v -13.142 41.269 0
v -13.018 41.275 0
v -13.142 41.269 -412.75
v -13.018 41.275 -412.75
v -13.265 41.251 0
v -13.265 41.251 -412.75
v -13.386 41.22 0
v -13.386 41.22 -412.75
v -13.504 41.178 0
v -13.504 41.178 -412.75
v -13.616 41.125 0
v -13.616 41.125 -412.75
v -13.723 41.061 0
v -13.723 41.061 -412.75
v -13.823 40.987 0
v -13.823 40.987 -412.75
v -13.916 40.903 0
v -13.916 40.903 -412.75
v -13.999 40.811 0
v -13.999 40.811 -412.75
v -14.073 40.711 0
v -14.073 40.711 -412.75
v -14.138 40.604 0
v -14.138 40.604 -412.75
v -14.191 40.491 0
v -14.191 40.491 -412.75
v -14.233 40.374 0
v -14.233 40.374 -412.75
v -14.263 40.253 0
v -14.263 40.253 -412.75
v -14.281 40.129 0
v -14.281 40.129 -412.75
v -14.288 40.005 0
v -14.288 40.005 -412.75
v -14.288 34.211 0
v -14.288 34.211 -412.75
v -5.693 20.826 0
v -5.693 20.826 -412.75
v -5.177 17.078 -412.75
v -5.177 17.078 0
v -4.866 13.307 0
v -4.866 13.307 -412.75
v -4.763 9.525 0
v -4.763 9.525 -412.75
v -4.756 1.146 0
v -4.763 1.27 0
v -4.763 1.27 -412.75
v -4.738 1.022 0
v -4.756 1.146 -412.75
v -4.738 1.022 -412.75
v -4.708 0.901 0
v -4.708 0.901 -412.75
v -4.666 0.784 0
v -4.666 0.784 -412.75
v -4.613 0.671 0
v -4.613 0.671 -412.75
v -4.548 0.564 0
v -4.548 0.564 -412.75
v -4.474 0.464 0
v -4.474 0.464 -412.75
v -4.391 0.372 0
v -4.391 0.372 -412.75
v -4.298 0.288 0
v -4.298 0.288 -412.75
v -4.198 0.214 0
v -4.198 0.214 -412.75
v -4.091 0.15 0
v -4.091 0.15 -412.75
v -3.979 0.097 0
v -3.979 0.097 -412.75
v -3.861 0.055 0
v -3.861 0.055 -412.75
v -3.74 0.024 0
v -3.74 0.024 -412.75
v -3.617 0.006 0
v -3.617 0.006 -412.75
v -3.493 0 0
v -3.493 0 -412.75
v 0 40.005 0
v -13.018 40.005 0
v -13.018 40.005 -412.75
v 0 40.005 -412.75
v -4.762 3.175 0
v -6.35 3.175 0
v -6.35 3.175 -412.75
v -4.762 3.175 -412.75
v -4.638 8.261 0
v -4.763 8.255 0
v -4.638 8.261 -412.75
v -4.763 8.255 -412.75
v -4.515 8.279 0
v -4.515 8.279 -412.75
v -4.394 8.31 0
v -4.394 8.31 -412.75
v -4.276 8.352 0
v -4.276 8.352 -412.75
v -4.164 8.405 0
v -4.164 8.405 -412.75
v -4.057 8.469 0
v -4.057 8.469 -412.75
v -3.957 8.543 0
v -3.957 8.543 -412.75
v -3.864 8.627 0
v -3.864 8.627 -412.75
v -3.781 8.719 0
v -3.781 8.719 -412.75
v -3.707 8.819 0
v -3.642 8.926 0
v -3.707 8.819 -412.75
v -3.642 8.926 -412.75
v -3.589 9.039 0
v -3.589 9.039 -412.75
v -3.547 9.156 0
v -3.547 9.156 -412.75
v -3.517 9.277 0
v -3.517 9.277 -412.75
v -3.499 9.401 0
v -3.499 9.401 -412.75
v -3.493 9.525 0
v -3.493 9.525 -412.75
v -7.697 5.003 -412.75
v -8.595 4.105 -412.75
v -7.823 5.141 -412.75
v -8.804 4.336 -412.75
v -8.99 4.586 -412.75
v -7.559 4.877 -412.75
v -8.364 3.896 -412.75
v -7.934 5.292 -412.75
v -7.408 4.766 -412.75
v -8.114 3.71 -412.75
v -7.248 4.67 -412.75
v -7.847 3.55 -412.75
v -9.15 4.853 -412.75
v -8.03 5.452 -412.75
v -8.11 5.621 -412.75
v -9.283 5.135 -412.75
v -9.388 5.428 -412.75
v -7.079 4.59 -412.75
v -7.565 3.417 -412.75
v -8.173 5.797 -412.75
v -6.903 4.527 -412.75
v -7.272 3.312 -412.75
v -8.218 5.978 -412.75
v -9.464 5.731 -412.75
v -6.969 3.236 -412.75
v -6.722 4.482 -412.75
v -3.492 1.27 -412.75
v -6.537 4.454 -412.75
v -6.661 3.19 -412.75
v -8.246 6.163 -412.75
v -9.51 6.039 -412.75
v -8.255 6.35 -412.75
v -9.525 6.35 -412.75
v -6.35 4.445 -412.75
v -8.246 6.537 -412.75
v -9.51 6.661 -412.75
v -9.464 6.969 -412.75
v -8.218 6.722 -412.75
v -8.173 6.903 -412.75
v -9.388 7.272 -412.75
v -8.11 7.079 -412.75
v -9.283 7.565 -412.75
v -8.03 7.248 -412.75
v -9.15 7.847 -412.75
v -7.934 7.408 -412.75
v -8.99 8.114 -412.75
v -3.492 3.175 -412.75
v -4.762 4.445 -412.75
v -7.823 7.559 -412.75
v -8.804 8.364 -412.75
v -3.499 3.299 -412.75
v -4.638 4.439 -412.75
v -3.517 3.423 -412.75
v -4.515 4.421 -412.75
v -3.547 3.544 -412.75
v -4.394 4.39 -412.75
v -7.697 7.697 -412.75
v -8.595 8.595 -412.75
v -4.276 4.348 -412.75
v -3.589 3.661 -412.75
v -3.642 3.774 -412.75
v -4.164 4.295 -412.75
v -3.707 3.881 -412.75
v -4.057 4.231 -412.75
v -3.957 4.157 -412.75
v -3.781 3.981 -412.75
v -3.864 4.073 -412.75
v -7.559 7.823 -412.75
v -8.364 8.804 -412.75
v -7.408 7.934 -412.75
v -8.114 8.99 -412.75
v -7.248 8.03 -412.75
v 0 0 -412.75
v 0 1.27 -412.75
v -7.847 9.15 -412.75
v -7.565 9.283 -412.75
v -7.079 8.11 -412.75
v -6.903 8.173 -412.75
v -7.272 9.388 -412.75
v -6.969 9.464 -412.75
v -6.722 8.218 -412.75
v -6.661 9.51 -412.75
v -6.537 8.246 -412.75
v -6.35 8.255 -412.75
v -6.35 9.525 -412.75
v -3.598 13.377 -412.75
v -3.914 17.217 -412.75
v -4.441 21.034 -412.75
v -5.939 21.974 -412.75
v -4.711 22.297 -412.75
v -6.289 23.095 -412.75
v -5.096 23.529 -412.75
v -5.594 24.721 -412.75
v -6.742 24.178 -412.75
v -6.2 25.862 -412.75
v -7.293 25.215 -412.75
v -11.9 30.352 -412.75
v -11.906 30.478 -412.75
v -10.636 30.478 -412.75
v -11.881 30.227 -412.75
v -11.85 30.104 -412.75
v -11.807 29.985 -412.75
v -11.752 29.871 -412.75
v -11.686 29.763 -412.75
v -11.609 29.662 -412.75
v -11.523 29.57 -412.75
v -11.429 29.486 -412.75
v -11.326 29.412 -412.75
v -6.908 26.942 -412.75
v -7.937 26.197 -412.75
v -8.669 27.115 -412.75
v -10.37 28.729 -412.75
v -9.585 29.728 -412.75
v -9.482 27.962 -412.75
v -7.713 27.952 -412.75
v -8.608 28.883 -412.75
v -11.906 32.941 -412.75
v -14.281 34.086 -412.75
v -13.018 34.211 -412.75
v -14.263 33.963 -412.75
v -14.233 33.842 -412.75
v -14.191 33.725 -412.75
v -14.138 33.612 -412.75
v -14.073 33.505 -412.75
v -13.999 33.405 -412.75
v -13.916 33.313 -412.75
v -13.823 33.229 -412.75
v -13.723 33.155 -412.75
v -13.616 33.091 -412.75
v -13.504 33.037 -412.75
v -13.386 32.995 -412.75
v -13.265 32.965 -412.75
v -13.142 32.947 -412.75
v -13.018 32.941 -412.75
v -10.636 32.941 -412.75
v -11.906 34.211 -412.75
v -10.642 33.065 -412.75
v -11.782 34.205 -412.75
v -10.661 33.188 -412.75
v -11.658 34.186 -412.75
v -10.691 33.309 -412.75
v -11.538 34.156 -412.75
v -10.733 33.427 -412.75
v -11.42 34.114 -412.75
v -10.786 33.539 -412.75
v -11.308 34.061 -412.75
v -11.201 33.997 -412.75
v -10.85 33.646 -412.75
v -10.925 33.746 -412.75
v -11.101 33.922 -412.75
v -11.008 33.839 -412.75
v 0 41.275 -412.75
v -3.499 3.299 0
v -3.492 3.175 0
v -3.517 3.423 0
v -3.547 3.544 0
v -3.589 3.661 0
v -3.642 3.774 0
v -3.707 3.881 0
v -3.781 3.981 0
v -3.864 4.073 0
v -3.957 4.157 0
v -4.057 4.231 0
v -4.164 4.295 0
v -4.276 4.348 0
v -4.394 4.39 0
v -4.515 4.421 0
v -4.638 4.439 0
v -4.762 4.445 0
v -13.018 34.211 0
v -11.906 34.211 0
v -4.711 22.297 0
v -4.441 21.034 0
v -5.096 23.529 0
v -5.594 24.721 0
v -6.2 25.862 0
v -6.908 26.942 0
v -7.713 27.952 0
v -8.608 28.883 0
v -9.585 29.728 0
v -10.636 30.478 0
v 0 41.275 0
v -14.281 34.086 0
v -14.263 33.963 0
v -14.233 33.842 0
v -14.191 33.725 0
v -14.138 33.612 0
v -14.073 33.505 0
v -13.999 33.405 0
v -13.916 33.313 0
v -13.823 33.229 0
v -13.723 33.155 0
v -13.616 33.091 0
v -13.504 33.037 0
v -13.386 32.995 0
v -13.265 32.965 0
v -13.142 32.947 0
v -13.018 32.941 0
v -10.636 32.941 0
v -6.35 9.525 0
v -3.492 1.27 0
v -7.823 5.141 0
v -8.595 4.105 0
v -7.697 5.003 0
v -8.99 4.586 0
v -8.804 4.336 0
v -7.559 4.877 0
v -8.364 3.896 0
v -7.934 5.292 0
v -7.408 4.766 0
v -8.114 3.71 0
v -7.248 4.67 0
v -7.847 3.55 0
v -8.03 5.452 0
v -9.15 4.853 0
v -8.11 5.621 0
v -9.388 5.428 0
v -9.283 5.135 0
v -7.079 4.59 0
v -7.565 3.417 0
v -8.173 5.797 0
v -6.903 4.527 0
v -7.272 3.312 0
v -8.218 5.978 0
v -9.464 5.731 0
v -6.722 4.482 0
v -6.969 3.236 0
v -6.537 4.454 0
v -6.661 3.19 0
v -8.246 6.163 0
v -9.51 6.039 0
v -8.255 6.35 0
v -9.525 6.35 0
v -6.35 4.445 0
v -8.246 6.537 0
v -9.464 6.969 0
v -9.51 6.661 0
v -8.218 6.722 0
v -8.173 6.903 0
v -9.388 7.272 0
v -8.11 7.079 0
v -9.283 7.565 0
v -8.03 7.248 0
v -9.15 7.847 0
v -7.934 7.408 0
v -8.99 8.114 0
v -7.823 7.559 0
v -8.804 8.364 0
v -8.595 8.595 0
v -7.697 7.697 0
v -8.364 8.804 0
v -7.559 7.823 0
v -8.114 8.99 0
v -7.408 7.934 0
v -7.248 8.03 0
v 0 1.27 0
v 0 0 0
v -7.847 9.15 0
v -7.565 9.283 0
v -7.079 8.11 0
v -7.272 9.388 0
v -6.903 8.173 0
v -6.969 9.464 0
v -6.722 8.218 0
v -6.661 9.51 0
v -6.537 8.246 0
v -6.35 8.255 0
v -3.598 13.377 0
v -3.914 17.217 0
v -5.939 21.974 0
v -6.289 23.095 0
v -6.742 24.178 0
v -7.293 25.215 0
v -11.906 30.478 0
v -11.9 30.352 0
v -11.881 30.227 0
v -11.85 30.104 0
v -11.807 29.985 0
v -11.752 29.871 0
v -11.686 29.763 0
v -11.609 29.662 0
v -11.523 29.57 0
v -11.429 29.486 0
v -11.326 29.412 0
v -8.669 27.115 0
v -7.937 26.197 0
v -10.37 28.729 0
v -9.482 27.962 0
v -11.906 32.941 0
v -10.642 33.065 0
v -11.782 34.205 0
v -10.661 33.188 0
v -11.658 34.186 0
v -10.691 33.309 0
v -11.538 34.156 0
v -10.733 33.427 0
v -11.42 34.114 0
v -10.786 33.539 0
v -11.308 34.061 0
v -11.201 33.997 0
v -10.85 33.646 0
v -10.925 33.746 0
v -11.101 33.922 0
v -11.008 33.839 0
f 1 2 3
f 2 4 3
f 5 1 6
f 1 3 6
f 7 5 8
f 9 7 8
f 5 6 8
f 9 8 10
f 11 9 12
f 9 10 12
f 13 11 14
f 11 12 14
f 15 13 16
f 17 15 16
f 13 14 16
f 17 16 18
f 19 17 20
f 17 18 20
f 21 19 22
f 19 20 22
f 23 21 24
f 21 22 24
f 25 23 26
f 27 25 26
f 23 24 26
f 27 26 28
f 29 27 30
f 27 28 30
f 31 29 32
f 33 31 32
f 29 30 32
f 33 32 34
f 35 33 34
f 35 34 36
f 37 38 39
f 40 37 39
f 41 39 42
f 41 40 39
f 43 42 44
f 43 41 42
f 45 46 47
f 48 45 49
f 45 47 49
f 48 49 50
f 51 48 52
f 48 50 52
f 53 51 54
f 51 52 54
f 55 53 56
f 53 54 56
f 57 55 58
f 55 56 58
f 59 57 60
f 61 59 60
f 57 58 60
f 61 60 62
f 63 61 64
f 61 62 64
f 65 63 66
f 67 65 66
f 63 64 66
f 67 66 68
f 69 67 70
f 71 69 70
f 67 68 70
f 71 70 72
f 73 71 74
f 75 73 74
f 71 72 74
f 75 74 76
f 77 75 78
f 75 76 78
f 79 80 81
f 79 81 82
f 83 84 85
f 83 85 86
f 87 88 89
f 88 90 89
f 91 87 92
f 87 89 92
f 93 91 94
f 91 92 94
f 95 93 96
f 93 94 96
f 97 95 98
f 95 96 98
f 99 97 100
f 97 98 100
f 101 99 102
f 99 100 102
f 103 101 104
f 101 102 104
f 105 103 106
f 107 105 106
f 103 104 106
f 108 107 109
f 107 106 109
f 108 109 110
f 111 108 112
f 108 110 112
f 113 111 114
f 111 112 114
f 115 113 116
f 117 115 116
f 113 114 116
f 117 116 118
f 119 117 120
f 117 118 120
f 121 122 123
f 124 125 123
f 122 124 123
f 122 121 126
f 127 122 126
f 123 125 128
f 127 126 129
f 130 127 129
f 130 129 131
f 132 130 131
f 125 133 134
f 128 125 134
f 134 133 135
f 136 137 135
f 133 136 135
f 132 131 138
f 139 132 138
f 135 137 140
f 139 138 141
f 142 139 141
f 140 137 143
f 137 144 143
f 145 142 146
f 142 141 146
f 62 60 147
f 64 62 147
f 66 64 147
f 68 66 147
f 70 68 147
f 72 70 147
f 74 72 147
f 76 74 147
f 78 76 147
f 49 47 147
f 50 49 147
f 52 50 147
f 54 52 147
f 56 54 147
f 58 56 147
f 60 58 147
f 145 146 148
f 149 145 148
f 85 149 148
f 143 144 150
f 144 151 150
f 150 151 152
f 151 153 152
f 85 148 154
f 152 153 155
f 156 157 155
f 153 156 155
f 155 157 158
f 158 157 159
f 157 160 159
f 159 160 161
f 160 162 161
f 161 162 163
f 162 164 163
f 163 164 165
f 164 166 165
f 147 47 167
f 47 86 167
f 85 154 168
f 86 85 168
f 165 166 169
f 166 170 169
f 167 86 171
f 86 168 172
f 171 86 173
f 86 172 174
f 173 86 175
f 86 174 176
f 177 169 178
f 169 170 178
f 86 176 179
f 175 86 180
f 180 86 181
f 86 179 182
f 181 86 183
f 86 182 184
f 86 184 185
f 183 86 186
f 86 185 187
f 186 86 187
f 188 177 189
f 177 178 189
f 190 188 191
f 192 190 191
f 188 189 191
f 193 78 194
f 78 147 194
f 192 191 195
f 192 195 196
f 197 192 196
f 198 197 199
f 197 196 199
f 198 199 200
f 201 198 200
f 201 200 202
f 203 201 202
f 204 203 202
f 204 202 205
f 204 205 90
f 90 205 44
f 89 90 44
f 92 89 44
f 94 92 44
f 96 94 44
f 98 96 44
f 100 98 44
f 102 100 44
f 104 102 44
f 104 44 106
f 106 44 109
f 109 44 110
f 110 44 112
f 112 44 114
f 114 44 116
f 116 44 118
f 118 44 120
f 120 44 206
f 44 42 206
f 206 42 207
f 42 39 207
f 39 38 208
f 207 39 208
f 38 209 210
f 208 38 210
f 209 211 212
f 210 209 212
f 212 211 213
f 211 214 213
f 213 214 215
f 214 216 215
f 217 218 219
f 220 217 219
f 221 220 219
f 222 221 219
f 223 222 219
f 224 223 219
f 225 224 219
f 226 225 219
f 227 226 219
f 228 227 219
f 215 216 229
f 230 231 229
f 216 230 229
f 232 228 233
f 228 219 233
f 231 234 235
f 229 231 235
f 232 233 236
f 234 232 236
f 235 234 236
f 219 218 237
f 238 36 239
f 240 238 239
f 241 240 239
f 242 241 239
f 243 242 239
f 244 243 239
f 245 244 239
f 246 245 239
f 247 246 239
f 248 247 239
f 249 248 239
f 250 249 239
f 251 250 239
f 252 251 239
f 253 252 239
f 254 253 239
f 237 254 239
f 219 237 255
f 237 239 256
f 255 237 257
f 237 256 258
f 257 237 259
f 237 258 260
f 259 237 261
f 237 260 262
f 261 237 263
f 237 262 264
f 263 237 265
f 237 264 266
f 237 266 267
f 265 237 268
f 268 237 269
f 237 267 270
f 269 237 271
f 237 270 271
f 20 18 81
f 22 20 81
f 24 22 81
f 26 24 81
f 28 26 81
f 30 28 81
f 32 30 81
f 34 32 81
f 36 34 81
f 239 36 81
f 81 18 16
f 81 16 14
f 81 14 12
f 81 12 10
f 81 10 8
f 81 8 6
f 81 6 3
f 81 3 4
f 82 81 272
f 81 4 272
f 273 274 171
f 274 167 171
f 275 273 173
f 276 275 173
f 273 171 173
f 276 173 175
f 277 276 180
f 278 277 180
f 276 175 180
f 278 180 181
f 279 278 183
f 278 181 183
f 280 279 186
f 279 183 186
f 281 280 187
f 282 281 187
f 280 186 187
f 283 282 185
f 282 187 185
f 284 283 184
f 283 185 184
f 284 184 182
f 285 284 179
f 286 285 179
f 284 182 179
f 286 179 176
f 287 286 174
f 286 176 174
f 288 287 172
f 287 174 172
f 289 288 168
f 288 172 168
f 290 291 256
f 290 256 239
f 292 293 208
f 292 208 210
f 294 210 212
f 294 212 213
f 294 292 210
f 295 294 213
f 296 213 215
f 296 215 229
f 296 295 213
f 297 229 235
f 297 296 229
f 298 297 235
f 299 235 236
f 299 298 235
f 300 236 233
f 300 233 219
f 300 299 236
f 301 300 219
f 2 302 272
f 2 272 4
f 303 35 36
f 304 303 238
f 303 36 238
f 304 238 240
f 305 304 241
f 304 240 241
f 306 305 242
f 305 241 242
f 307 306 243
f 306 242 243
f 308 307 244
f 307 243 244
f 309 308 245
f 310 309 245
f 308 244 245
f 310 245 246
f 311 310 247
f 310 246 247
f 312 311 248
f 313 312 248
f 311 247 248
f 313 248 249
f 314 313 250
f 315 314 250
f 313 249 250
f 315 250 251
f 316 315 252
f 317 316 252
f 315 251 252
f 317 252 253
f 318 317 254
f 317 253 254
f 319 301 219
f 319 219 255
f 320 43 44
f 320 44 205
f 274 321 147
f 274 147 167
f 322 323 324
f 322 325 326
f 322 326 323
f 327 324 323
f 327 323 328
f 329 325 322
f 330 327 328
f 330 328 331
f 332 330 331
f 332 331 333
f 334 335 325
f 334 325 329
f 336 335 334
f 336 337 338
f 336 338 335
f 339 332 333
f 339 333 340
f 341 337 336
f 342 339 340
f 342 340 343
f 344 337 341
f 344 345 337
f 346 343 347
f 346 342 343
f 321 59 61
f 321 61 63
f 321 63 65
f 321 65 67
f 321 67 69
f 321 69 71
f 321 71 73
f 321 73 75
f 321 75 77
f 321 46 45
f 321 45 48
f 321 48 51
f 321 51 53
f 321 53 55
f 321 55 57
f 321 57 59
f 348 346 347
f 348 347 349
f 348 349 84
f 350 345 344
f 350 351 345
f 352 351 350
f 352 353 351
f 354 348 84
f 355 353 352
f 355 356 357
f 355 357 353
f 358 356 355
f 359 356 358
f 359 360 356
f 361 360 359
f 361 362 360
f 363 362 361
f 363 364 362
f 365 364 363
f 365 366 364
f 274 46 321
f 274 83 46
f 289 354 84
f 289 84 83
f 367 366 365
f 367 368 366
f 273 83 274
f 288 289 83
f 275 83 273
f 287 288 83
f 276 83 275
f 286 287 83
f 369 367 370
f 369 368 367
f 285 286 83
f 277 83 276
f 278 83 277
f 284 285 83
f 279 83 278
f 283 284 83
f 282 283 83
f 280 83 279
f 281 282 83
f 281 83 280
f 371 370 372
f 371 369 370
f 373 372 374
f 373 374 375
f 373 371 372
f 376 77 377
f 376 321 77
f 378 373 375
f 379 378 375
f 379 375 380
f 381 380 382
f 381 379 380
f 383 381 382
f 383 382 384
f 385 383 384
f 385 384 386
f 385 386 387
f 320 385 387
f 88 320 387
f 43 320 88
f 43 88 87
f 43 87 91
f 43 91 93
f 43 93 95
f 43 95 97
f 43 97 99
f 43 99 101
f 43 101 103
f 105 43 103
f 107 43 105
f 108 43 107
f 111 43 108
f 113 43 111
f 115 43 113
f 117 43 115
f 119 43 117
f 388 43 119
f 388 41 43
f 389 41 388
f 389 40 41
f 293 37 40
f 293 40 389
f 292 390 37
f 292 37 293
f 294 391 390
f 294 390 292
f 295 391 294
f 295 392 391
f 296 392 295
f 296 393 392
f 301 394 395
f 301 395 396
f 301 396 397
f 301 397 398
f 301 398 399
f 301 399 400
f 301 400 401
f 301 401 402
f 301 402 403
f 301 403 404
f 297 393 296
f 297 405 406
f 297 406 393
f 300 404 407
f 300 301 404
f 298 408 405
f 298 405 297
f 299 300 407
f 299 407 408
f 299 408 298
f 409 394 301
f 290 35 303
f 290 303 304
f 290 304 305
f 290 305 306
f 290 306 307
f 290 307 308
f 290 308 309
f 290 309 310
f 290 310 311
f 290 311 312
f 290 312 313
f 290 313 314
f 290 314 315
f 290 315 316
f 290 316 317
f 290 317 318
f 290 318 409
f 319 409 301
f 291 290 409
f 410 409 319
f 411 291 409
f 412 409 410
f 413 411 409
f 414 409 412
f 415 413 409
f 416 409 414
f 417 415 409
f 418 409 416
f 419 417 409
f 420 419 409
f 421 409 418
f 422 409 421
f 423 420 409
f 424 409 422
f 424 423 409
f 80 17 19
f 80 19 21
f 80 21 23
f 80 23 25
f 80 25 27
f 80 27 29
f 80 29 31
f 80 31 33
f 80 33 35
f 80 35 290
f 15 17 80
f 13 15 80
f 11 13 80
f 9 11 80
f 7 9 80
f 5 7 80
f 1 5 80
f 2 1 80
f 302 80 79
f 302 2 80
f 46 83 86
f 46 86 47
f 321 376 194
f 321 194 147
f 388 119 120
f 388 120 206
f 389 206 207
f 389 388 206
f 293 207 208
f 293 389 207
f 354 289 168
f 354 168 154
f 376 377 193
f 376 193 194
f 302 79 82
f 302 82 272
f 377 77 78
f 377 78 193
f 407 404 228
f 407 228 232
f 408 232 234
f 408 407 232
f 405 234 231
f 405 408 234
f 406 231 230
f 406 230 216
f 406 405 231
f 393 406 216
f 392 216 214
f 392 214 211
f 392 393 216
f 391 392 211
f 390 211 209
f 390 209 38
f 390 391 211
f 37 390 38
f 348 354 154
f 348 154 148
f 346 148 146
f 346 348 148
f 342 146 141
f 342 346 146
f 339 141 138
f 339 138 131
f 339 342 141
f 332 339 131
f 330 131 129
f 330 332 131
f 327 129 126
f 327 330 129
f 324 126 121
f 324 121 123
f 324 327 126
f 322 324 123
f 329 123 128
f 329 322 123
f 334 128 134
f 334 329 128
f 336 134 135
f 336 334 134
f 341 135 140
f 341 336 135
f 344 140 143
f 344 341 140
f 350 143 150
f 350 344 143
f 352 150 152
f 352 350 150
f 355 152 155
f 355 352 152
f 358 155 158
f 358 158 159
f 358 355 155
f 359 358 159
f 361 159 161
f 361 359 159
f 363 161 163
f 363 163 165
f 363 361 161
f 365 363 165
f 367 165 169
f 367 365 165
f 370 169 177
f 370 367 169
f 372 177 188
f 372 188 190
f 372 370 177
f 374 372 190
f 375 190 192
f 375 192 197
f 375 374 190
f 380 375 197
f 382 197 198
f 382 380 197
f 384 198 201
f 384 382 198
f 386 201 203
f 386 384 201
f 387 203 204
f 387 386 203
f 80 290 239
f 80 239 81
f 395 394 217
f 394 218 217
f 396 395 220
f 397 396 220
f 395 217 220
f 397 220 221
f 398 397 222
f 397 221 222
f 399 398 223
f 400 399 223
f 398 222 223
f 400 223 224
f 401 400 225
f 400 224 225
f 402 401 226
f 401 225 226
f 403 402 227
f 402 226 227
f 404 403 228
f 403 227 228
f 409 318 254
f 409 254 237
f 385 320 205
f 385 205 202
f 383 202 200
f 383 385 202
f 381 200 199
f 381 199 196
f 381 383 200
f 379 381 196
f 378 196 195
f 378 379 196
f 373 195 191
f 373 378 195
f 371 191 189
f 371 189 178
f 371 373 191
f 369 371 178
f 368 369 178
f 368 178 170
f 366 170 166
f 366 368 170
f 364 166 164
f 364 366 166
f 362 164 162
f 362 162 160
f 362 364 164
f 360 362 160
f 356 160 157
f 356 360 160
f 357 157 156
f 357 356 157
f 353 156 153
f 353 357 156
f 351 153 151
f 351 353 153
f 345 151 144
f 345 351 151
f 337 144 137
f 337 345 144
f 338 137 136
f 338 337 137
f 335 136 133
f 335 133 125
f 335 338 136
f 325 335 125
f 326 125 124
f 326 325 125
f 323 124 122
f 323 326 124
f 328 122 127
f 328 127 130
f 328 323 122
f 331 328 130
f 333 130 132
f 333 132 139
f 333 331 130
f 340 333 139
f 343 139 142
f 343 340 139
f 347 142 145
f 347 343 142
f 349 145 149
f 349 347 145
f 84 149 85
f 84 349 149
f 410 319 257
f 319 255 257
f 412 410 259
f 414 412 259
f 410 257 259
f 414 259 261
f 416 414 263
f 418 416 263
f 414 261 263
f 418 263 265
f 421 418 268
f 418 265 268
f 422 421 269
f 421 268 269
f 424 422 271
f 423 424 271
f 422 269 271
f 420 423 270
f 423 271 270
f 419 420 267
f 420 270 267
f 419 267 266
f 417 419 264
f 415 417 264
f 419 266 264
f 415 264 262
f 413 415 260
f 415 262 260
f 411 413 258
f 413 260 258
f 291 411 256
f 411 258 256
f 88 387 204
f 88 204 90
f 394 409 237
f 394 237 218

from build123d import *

# Parameters (mm, degrees)
EXTRUDE_THIN1_DEPTH = 412.75
FILLET1_R           = 1.27


with BuildPart() as part:
    # Sketch1 → Extrude-Thin1 (new body)
    with BuildSketch(Plane.XY):
        with BuildLine():
            Line((0, 41.275), (-14.2875, 41.275))
            Line((-14.2875, 41.275), (-14.2875, 32.940625))
            Line((-14.2875, 32.940625), (-11.90625, 32.940625))
            Line((-11.90625, 32.940625), (-11.90625, 29.765625))
            ThreePointArc((-11.90625, 29.765625), (-7.793372209, 25.995204752), (-5.693451363, 20.825856146))
            ThreePointArc((-5.693451363, 20.825856146), (-4.995631362, 15.194568327), (-4.7625, 9.525))
            Line((-4.7625, 9.525), (-6.35, 9.525))
            ThreePointArc((-6.35, 9.525), (-9.525, 6.35), (-6.35, 3.175))
            Line((-6.35, 3.175), (-4.7625, 3.175))
            Line((-4.7625, 3.175), (-4.7625, 0))
            Line((-4.7625, 0), (0, 0))
            Line((0, 0), (0, 1.27))
            Line((0, 1.27), (-3.4925, 1.27))
            Line((-3.4925, 1.27), (-3.4925, 4.445))
            Line((-3.4925, 4.445), (-6.35, 4.445))
            ThreePointArc((-6.35, 4.445), (-8.255, 6.35), (-6.35, 8.255))
            Line((-6.35, 8.255), (-3.503968204, 8.255))
            ThreePointArc((-3.503968204, 8.255), (-3.680640178, 14.665718794), (-4.440572307, 21.033687983))
            ThreePointArc((-4.440572307, 21.033687983), (-6.541275078, 26.410168765), (-10.63625, 30.47842123))
            Line((-10.63625, 30.47842123), (-10.63625, 34.210625))
            Line((-10.63625, 34.210625), (-13.0175, 34.210625))
            Line((-13.0175, 34.210625), (-13.0175, 40.005))
            Line((-13.0175, 40.005), (0, 40.005))
            Line((0, 40.005), (0, 41.275))
        make_face()
    extrude(amount=-EXTRUDE_THIN1_DEPTH)

    # Fillet1
    fillet1_edges = [part.edges().sort_by_distance(p)[0] for p in [
        (-4.7625, 0, -206.375),
        (-11.90625, 29.765625, -206.375),
        (-14.2875, 32.940625, -206.375),
        (-14.2875, 41.275, -206.375),
        (-10.63625, 34.210625, -206.375),
        (-3.503968204, 8.255, -206.375),
        (-3.4925, 4.445, -206.375),
    ]]
    fillet(fillet1_edges, radius=FILLET1_R)


solid = part.part
